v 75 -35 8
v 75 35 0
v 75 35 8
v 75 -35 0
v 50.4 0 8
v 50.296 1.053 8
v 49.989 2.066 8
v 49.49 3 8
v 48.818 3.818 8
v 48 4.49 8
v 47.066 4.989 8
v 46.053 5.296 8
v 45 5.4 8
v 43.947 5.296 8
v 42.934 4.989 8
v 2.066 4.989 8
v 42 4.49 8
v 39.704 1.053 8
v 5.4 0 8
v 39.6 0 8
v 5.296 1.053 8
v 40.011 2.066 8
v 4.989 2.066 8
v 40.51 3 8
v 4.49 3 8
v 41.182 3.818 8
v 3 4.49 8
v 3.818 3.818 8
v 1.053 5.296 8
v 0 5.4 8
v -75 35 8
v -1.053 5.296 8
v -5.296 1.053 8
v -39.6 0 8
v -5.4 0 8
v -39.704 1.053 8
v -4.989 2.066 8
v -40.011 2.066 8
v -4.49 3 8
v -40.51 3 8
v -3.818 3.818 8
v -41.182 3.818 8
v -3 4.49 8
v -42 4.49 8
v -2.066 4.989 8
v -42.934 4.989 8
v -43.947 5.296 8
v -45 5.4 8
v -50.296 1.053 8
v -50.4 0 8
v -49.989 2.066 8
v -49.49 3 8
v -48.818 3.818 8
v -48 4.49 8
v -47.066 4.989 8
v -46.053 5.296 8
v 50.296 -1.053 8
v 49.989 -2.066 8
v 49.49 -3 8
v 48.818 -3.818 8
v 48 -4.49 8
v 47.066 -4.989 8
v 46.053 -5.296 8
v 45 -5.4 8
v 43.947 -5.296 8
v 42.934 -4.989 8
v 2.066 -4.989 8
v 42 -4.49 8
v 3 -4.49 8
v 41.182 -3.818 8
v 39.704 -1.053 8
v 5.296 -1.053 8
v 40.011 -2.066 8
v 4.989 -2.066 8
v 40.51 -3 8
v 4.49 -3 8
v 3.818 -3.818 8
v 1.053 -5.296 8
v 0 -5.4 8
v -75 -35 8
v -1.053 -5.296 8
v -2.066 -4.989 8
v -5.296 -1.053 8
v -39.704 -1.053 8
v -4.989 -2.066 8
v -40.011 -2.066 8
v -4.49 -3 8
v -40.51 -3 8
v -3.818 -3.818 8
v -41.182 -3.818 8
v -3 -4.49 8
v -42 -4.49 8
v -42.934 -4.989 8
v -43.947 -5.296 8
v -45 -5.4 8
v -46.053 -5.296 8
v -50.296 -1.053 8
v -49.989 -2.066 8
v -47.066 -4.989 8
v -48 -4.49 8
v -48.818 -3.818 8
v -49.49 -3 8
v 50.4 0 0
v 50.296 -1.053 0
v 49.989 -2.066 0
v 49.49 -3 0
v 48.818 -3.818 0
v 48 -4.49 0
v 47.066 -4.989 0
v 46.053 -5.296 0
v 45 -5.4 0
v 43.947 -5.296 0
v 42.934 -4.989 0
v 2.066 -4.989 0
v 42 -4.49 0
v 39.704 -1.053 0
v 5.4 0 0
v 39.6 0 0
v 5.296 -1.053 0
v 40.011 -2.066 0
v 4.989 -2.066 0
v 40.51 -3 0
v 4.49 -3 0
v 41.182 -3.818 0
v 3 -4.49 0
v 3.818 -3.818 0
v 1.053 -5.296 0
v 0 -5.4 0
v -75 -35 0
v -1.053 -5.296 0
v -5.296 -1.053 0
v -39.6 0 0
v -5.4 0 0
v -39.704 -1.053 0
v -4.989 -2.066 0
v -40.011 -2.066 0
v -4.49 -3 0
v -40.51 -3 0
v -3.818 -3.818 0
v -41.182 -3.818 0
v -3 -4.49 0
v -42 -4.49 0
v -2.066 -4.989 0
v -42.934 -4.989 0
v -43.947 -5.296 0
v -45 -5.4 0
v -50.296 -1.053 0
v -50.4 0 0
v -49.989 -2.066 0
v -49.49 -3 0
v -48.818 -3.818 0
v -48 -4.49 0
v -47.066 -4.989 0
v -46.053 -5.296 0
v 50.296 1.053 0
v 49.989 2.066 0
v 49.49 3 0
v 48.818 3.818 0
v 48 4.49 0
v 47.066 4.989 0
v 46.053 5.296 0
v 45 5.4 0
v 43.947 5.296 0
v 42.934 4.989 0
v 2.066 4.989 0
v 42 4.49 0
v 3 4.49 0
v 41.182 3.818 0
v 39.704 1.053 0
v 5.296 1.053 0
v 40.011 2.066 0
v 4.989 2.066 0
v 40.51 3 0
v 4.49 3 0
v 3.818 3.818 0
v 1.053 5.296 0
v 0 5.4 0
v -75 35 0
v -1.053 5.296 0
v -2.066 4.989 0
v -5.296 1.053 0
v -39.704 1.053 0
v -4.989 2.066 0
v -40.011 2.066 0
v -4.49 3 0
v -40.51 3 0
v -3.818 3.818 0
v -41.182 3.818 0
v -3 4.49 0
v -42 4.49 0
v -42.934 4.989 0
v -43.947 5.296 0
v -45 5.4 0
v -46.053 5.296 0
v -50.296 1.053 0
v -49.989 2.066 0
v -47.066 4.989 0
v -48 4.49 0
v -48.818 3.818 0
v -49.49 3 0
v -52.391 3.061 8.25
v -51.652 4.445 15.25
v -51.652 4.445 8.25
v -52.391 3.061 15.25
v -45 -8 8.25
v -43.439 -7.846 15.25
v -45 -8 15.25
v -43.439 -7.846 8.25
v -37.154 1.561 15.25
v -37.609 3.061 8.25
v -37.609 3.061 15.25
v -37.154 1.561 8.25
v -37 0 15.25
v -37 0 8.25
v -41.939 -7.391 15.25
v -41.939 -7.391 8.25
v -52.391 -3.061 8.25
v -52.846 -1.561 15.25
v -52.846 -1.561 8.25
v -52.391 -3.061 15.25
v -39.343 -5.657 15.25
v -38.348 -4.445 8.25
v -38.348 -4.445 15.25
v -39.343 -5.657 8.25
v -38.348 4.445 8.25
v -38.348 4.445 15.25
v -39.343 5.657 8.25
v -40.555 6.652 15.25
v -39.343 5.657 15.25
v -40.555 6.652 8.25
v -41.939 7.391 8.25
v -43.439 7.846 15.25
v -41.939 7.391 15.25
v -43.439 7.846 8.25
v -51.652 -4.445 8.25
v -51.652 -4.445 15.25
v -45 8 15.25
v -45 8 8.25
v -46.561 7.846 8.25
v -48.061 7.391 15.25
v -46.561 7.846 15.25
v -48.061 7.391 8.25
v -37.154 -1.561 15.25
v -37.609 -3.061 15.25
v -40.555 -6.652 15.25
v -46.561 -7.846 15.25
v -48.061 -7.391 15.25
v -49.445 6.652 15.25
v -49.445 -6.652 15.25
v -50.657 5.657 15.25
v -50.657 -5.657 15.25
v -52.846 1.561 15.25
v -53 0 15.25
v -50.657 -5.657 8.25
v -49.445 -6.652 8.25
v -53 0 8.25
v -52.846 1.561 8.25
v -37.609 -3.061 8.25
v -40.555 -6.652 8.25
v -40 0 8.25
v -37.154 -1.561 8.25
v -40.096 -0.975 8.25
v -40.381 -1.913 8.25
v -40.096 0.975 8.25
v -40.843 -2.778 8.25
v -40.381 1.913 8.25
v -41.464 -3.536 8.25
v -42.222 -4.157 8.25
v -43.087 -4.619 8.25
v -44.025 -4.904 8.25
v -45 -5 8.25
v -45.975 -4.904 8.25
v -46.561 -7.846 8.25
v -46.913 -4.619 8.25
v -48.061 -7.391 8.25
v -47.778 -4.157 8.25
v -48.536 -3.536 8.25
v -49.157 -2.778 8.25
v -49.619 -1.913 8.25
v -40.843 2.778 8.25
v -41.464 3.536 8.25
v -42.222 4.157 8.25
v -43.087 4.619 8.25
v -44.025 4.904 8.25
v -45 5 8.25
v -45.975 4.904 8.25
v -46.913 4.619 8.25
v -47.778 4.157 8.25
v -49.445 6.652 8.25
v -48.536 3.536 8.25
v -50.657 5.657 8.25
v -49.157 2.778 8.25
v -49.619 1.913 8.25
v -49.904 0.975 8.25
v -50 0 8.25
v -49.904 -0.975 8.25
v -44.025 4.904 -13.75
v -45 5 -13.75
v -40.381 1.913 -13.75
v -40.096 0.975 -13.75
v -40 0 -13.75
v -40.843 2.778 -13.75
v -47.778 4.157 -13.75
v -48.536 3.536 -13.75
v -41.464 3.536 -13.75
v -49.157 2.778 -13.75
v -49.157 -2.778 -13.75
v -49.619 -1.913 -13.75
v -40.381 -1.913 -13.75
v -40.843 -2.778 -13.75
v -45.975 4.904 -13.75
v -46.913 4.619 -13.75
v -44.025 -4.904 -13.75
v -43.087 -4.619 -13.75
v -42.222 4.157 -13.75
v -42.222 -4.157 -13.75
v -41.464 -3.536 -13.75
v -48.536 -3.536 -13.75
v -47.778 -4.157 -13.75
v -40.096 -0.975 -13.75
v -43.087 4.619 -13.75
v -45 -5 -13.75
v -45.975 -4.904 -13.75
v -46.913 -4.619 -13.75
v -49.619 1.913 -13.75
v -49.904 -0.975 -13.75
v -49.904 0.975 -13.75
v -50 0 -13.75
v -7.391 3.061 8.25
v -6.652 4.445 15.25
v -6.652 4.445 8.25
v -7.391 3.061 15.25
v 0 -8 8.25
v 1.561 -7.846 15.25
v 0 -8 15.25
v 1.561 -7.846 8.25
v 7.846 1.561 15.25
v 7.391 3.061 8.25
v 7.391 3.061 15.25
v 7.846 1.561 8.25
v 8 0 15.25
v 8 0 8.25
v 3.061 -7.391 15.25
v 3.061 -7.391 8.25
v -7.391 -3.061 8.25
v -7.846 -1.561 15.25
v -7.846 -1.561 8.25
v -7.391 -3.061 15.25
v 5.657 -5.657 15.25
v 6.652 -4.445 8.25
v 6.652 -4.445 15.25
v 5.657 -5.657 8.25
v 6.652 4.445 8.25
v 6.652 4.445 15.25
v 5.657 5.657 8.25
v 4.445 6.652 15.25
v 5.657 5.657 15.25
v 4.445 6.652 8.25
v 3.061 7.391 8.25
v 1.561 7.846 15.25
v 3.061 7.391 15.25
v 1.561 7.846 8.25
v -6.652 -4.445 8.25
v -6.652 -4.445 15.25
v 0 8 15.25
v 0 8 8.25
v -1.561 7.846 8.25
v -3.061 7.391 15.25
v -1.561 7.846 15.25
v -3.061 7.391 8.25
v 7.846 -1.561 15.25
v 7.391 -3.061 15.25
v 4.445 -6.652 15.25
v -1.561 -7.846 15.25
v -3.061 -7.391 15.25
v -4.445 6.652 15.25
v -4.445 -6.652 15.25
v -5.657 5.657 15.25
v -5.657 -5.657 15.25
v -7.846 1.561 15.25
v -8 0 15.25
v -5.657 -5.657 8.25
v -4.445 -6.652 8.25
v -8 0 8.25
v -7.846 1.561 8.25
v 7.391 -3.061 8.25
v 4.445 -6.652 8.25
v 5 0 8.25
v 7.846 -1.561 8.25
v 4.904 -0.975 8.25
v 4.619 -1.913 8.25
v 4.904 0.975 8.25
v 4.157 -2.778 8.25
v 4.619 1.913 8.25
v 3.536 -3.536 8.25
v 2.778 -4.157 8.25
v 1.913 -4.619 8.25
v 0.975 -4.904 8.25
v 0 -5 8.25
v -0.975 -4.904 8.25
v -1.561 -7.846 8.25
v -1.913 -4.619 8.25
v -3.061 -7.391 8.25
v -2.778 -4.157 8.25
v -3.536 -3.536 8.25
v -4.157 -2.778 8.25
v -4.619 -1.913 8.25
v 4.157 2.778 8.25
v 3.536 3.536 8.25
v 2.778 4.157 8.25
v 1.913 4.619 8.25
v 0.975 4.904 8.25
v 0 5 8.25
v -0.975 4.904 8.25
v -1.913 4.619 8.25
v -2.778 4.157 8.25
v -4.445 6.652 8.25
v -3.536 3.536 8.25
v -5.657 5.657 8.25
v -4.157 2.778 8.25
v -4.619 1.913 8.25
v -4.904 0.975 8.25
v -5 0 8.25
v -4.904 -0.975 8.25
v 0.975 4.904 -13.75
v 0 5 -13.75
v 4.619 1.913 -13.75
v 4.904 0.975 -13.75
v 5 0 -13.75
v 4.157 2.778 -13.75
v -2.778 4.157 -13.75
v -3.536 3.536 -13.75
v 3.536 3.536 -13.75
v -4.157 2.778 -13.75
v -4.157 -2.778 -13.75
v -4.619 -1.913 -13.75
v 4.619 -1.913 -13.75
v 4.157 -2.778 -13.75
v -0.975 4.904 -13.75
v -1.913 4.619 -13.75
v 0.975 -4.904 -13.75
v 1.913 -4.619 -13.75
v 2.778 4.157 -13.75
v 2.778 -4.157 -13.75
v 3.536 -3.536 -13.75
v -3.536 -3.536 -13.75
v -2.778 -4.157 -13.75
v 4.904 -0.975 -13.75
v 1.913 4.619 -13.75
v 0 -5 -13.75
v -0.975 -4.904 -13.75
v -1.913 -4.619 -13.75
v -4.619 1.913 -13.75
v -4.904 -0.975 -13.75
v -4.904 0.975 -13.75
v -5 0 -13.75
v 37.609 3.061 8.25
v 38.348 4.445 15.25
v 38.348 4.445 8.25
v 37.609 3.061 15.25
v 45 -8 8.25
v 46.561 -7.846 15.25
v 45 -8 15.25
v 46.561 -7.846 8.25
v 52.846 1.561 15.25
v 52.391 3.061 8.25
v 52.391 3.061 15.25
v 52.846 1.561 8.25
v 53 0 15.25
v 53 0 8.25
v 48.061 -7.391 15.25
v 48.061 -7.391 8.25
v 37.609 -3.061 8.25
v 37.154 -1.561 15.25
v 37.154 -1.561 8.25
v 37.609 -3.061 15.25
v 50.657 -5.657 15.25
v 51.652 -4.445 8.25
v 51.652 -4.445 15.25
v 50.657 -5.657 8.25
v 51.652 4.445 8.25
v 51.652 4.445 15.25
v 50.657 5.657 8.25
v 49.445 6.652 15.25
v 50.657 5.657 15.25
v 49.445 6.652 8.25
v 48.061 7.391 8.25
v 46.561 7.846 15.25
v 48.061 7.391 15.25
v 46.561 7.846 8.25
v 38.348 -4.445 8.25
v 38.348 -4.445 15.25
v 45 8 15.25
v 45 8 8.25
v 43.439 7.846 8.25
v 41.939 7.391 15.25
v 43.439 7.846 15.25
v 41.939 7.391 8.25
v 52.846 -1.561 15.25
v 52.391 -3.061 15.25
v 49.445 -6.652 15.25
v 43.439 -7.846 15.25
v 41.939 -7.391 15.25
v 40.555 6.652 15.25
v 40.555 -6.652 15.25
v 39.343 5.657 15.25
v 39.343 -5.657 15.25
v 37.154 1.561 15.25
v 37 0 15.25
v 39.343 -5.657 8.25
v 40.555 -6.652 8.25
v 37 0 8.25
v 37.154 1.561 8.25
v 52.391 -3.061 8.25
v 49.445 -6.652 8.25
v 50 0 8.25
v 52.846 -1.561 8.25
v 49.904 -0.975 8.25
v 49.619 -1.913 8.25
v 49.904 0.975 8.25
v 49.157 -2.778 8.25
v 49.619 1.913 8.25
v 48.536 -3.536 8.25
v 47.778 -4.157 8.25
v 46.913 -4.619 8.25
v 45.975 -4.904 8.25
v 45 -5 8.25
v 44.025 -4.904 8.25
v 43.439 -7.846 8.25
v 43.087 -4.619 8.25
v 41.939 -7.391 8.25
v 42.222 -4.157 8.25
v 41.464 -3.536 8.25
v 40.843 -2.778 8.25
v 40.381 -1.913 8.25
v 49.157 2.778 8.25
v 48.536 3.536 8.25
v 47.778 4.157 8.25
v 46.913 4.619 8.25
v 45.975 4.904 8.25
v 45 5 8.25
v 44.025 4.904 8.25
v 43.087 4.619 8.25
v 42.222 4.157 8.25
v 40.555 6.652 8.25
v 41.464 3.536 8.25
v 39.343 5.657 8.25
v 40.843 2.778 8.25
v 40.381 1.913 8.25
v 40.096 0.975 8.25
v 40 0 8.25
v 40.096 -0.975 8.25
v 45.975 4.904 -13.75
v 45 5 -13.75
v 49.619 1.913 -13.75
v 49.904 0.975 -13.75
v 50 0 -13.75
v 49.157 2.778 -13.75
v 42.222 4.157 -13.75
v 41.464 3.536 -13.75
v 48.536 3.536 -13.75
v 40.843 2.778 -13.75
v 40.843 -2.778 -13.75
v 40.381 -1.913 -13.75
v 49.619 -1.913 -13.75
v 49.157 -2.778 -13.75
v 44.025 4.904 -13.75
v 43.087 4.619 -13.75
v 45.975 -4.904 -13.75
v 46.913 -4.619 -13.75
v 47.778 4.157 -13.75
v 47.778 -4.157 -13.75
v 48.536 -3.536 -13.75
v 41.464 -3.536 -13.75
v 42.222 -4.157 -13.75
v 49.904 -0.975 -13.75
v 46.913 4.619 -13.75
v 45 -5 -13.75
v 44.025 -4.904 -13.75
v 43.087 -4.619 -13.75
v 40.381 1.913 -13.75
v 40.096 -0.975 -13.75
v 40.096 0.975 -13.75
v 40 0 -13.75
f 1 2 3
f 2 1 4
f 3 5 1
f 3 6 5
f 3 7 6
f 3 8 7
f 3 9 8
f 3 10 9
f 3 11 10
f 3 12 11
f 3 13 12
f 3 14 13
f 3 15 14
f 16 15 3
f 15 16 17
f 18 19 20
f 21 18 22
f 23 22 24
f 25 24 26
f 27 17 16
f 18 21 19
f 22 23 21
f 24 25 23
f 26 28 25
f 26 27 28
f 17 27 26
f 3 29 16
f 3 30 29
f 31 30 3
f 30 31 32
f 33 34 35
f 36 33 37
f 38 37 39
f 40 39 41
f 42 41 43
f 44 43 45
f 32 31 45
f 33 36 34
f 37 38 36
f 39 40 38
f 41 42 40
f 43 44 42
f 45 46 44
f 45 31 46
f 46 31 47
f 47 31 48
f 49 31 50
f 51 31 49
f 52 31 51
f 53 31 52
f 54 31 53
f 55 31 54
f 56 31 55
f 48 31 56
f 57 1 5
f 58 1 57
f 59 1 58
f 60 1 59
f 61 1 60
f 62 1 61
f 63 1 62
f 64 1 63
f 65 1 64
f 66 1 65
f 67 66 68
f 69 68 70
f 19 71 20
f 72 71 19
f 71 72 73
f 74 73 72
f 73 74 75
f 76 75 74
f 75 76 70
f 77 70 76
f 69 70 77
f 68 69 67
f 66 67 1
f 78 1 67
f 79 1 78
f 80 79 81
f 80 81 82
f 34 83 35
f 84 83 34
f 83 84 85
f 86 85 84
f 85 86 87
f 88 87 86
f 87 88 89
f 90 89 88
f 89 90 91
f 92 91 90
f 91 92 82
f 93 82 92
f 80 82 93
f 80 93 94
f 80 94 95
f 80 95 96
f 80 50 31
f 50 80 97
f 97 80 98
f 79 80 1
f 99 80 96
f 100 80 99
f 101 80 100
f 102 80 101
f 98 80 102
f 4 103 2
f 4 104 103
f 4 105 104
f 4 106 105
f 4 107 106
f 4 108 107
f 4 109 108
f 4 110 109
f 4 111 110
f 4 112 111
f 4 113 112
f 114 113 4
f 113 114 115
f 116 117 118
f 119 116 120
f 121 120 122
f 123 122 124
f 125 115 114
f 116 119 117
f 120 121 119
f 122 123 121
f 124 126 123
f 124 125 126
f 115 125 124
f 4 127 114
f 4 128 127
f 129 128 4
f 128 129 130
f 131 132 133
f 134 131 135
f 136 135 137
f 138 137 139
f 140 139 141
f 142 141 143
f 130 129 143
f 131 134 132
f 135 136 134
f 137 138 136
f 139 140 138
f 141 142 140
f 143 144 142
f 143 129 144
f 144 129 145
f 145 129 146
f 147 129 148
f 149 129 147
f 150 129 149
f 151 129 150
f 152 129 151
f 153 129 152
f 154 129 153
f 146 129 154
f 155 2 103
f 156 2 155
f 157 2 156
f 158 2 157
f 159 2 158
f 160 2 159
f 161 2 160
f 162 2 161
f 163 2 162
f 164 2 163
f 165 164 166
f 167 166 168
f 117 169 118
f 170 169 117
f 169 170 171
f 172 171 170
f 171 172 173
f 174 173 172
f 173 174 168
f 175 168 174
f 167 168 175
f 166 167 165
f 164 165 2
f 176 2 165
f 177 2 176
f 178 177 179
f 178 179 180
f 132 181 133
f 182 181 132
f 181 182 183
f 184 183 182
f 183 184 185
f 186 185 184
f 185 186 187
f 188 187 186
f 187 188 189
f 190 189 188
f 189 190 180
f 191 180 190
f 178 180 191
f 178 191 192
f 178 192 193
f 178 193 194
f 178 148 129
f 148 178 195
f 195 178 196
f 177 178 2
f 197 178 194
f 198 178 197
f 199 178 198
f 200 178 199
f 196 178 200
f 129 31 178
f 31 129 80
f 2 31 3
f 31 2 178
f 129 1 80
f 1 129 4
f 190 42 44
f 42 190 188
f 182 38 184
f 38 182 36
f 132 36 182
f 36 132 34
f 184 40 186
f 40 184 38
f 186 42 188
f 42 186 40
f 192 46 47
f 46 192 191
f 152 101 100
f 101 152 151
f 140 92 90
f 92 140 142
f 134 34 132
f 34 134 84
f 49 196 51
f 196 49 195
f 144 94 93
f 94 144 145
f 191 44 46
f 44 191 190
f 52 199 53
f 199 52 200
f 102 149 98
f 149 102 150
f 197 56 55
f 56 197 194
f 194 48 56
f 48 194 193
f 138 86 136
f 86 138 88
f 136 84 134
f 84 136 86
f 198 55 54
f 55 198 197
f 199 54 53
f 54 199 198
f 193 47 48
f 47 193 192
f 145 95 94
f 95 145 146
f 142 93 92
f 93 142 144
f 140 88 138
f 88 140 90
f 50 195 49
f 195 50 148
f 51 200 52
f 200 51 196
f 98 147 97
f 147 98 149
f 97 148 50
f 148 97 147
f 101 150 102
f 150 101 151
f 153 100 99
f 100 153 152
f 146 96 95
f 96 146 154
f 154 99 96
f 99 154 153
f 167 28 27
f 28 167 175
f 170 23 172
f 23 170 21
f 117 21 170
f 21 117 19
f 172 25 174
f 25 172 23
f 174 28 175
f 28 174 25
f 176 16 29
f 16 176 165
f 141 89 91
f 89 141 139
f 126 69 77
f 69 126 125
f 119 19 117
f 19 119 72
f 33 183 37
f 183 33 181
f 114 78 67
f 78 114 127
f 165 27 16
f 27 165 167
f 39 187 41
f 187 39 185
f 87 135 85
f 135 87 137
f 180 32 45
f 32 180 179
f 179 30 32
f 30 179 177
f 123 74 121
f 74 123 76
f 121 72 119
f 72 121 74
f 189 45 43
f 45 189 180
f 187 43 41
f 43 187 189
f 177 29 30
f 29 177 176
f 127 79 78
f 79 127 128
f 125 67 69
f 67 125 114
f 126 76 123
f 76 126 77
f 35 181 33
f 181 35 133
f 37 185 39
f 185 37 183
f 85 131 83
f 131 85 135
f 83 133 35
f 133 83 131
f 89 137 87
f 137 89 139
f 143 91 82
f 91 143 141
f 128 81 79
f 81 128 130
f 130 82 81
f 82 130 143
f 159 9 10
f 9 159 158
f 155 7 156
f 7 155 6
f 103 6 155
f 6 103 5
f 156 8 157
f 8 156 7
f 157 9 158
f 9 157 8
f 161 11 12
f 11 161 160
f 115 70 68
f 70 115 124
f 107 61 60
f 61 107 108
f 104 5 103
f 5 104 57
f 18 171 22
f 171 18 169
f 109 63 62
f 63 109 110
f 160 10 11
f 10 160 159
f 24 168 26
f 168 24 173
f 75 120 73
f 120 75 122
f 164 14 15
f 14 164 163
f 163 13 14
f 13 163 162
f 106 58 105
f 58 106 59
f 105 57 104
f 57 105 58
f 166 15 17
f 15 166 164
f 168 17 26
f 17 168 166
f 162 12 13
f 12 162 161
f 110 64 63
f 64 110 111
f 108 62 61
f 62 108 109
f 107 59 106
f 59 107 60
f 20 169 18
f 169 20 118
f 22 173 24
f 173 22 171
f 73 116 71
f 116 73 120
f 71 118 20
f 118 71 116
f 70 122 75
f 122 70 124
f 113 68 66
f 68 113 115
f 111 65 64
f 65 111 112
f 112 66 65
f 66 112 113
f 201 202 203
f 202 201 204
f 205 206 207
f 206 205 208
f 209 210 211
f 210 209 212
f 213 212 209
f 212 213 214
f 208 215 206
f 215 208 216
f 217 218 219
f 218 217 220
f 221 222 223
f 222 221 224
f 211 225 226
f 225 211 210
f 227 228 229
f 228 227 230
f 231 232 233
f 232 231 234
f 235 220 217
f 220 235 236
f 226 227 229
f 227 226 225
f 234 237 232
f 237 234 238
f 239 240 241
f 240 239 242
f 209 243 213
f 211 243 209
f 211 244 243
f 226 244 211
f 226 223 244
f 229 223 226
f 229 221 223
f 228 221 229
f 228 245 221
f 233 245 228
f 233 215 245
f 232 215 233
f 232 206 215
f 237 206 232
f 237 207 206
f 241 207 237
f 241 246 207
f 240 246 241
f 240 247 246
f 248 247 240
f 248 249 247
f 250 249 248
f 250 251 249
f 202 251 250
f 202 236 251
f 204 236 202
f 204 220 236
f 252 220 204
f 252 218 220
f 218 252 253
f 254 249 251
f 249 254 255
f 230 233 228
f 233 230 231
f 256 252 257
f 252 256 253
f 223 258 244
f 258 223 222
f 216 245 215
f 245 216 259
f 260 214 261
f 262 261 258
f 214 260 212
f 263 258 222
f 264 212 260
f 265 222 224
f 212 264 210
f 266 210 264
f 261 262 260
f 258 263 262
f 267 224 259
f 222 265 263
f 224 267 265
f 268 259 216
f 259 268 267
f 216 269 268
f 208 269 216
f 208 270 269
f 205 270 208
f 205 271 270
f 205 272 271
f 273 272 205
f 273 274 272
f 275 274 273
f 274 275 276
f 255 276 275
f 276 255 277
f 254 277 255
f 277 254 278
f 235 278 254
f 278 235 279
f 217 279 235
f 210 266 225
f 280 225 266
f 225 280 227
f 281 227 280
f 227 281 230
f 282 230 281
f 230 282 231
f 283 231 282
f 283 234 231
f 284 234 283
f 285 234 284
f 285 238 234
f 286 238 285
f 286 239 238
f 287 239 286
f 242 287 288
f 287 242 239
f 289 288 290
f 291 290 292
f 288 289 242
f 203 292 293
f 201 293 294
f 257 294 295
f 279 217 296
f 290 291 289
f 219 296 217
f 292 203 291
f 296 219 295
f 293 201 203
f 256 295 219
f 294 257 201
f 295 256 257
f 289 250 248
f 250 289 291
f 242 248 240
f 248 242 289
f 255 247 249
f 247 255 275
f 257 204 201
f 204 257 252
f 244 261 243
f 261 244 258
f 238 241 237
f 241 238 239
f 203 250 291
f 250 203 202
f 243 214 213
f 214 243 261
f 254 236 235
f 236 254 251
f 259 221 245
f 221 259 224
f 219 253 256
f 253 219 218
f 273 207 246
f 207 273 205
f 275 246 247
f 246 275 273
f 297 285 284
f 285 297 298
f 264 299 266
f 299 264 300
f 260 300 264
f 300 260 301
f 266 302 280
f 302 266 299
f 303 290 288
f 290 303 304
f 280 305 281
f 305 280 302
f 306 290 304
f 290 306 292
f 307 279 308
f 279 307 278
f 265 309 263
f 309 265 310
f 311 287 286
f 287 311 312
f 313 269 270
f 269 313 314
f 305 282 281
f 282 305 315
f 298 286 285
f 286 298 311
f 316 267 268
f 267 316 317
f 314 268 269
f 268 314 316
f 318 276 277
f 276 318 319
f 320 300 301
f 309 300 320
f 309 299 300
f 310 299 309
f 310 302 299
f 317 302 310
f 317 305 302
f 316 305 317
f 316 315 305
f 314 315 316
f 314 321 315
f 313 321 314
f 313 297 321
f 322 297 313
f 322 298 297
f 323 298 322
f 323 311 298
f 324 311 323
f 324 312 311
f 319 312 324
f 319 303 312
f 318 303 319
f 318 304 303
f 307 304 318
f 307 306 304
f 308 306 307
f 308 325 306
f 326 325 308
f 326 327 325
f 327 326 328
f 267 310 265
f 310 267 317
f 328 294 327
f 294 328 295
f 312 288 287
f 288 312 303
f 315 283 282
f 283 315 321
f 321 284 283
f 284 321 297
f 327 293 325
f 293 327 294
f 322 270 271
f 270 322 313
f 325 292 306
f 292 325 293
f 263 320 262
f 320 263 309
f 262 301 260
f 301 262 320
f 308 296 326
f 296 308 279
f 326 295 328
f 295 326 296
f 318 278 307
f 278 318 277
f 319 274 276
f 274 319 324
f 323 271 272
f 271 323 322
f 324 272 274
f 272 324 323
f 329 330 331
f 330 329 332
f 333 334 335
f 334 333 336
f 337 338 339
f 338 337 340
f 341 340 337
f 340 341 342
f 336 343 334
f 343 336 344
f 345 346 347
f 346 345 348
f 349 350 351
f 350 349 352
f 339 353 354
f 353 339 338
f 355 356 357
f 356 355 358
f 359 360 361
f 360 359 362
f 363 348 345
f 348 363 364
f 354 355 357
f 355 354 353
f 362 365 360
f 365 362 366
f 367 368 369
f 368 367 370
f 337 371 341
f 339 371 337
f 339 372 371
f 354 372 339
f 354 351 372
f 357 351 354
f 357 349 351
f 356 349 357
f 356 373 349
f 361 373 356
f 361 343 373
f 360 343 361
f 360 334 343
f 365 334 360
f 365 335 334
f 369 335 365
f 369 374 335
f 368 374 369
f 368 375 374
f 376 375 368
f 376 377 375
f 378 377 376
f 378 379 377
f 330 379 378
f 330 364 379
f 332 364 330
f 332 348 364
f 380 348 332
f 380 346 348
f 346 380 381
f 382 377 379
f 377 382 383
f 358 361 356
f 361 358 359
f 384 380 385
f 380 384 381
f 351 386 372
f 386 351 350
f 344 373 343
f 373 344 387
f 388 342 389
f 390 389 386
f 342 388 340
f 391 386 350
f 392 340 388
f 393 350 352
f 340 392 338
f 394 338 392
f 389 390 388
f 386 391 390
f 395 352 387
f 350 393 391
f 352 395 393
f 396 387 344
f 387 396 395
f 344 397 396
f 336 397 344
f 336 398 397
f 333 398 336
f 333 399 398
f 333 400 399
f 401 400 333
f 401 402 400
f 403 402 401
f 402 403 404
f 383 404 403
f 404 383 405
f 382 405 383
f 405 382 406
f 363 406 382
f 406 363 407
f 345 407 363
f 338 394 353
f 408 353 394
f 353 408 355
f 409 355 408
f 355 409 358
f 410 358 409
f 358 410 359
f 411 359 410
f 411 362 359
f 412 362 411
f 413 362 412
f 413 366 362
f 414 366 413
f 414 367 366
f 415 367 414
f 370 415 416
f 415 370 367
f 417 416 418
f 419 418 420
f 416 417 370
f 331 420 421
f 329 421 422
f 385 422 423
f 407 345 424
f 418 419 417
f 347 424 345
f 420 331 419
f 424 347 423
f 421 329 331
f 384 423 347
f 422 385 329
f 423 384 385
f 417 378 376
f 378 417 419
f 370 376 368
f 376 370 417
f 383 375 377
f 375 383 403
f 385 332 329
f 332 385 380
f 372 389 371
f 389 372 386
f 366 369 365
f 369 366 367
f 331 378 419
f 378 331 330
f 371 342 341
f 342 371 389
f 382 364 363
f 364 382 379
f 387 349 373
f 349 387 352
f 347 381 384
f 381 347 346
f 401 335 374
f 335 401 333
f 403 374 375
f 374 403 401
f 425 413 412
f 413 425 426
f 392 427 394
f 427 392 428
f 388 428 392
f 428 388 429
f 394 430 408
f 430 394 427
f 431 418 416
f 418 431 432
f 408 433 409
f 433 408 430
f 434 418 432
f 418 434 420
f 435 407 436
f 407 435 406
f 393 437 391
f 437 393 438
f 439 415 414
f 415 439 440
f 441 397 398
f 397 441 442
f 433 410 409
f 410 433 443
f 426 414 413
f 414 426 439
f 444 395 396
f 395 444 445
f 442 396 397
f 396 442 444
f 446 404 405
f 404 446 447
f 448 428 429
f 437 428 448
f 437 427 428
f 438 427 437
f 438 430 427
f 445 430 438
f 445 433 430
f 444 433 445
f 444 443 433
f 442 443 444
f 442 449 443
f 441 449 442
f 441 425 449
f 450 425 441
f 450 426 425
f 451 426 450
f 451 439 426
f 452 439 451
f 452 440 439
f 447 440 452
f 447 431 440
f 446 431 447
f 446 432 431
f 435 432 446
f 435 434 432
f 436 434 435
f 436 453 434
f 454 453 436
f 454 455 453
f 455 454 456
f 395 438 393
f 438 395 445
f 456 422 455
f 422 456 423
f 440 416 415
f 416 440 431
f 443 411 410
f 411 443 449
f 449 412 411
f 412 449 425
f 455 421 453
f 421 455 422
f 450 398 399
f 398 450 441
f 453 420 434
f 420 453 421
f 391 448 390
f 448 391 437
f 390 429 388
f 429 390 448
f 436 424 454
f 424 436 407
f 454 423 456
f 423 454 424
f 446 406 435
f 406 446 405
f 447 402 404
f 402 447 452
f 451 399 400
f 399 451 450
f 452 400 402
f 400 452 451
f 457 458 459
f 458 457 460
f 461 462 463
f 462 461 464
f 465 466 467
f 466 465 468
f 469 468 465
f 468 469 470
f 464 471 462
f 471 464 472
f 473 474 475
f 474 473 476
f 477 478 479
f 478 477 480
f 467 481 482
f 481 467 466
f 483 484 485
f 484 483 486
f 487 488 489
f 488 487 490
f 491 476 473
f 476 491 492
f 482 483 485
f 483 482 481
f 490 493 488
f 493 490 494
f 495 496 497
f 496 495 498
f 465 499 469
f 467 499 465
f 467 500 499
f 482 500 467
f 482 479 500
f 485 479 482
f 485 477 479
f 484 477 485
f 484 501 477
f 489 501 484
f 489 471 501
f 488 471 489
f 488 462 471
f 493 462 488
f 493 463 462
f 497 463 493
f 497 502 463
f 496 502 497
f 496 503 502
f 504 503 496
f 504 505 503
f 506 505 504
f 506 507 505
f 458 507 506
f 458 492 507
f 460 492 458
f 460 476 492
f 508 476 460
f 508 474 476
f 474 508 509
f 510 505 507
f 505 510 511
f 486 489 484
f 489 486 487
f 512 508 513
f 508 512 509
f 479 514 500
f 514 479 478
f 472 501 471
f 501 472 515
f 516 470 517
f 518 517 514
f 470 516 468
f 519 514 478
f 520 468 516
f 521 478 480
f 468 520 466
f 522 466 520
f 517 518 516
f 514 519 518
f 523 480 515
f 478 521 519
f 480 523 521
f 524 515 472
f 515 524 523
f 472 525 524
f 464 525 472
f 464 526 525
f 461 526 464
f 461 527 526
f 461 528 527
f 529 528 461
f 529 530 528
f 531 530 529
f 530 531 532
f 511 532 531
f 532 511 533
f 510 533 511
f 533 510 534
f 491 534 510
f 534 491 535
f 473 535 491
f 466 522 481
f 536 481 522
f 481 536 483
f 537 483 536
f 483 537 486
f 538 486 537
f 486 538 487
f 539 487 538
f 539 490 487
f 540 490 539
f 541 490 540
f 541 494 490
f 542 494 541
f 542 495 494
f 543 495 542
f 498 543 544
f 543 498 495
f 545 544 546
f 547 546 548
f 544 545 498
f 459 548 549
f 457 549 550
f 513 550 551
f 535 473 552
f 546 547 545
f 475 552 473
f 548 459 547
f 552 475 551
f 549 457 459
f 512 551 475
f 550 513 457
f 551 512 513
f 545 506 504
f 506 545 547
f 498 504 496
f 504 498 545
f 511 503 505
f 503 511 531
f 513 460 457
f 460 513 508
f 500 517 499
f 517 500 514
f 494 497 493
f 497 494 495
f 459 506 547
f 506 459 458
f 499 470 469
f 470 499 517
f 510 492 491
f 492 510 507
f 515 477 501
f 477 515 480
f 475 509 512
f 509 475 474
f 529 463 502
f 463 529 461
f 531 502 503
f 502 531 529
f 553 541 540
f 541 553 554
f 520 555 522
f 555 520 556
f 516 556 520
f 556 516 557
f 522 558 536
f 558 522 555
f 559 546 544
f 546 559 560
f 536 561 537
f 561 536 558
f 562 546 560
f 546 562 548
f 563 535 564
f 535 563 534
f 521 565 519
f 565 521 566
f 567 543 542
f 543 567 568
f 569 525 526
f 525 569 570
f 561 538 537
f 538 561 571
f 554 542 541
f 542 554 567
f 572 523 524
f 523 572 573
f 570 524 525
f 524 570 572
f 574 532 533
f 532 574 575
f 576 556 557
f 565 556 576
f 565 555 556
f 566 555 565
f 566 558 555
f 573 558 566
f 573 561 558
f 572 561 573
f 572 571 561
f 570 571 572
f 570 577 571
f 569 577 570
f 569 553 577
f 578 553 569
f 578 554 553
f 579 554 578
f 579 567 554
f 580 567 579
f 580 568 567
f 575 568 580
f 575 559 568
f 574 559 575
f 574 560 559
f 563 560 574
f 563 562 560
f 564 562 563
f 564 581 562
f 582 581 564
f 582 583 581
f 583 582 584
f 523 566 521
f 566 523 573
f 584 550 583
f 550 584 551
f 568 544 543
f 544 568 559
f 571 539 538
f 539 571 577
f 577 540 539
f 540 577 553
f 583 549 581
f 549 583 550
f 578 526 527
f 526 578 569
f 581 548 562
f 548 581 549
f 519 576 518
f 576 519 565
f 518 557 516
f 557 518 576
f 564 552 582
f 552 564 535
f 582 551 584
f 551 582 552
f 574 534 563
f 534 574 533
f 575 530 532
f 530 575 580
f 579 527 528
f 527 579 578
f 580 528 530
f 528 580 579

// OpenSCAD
$fn = 32;

// ------------------------------------------------------------------------
// Bolted plate: 150 x 70 x 8 mm plate, 3 fasteners
// Every part is its own module, assembly() places them once.
// ------------------------------------------------------------------------

// --- part 1 ---
module plate() {
  difference() {
    translate([-75, -35, 0]) cube([150, 70, 8]);
    translate([-45, 0, -1]) cylinder(h = 10, d = 10.8);
    translate([0, 0, -1]) cylinder(h = 10, d = 10.8);
    translate([45, 0, -1]) cylinder(h = 10, d = 10.8);
  }
}

// --- part 2 ---
module bolt1() {
  cylinder(h = 7, d = 16);
  translate([0, 0, -22]) cylinder(h = 22, d = 10);
}

// --- part 3 ---
module bolt2() {
  cylinder(h = 7, d = 16);
  translate([0, 0, -22]) cylinder(h = 22, d = 10);
}

// --- part 4 ---
module bolt3() {
  cylinder(h = 7, d = 16);
  translate([0, 0, -22]) cylinder(h = 22, d = 10);
}

// --- assembly ---
module assembly() {
  translate([0, 0, 0]) rotate([0, 0, 0]) plate();
  translate([-45, 0, 8.25]) rotate([0, 0, 0]) bolt1();
  translate([0, 0, 8.25]) rotate([0, 0, 0]) bolt2();
  translate([45, 0, 8.25]) rotate([0, 0, 0]) bolt3();
}

assembly();
